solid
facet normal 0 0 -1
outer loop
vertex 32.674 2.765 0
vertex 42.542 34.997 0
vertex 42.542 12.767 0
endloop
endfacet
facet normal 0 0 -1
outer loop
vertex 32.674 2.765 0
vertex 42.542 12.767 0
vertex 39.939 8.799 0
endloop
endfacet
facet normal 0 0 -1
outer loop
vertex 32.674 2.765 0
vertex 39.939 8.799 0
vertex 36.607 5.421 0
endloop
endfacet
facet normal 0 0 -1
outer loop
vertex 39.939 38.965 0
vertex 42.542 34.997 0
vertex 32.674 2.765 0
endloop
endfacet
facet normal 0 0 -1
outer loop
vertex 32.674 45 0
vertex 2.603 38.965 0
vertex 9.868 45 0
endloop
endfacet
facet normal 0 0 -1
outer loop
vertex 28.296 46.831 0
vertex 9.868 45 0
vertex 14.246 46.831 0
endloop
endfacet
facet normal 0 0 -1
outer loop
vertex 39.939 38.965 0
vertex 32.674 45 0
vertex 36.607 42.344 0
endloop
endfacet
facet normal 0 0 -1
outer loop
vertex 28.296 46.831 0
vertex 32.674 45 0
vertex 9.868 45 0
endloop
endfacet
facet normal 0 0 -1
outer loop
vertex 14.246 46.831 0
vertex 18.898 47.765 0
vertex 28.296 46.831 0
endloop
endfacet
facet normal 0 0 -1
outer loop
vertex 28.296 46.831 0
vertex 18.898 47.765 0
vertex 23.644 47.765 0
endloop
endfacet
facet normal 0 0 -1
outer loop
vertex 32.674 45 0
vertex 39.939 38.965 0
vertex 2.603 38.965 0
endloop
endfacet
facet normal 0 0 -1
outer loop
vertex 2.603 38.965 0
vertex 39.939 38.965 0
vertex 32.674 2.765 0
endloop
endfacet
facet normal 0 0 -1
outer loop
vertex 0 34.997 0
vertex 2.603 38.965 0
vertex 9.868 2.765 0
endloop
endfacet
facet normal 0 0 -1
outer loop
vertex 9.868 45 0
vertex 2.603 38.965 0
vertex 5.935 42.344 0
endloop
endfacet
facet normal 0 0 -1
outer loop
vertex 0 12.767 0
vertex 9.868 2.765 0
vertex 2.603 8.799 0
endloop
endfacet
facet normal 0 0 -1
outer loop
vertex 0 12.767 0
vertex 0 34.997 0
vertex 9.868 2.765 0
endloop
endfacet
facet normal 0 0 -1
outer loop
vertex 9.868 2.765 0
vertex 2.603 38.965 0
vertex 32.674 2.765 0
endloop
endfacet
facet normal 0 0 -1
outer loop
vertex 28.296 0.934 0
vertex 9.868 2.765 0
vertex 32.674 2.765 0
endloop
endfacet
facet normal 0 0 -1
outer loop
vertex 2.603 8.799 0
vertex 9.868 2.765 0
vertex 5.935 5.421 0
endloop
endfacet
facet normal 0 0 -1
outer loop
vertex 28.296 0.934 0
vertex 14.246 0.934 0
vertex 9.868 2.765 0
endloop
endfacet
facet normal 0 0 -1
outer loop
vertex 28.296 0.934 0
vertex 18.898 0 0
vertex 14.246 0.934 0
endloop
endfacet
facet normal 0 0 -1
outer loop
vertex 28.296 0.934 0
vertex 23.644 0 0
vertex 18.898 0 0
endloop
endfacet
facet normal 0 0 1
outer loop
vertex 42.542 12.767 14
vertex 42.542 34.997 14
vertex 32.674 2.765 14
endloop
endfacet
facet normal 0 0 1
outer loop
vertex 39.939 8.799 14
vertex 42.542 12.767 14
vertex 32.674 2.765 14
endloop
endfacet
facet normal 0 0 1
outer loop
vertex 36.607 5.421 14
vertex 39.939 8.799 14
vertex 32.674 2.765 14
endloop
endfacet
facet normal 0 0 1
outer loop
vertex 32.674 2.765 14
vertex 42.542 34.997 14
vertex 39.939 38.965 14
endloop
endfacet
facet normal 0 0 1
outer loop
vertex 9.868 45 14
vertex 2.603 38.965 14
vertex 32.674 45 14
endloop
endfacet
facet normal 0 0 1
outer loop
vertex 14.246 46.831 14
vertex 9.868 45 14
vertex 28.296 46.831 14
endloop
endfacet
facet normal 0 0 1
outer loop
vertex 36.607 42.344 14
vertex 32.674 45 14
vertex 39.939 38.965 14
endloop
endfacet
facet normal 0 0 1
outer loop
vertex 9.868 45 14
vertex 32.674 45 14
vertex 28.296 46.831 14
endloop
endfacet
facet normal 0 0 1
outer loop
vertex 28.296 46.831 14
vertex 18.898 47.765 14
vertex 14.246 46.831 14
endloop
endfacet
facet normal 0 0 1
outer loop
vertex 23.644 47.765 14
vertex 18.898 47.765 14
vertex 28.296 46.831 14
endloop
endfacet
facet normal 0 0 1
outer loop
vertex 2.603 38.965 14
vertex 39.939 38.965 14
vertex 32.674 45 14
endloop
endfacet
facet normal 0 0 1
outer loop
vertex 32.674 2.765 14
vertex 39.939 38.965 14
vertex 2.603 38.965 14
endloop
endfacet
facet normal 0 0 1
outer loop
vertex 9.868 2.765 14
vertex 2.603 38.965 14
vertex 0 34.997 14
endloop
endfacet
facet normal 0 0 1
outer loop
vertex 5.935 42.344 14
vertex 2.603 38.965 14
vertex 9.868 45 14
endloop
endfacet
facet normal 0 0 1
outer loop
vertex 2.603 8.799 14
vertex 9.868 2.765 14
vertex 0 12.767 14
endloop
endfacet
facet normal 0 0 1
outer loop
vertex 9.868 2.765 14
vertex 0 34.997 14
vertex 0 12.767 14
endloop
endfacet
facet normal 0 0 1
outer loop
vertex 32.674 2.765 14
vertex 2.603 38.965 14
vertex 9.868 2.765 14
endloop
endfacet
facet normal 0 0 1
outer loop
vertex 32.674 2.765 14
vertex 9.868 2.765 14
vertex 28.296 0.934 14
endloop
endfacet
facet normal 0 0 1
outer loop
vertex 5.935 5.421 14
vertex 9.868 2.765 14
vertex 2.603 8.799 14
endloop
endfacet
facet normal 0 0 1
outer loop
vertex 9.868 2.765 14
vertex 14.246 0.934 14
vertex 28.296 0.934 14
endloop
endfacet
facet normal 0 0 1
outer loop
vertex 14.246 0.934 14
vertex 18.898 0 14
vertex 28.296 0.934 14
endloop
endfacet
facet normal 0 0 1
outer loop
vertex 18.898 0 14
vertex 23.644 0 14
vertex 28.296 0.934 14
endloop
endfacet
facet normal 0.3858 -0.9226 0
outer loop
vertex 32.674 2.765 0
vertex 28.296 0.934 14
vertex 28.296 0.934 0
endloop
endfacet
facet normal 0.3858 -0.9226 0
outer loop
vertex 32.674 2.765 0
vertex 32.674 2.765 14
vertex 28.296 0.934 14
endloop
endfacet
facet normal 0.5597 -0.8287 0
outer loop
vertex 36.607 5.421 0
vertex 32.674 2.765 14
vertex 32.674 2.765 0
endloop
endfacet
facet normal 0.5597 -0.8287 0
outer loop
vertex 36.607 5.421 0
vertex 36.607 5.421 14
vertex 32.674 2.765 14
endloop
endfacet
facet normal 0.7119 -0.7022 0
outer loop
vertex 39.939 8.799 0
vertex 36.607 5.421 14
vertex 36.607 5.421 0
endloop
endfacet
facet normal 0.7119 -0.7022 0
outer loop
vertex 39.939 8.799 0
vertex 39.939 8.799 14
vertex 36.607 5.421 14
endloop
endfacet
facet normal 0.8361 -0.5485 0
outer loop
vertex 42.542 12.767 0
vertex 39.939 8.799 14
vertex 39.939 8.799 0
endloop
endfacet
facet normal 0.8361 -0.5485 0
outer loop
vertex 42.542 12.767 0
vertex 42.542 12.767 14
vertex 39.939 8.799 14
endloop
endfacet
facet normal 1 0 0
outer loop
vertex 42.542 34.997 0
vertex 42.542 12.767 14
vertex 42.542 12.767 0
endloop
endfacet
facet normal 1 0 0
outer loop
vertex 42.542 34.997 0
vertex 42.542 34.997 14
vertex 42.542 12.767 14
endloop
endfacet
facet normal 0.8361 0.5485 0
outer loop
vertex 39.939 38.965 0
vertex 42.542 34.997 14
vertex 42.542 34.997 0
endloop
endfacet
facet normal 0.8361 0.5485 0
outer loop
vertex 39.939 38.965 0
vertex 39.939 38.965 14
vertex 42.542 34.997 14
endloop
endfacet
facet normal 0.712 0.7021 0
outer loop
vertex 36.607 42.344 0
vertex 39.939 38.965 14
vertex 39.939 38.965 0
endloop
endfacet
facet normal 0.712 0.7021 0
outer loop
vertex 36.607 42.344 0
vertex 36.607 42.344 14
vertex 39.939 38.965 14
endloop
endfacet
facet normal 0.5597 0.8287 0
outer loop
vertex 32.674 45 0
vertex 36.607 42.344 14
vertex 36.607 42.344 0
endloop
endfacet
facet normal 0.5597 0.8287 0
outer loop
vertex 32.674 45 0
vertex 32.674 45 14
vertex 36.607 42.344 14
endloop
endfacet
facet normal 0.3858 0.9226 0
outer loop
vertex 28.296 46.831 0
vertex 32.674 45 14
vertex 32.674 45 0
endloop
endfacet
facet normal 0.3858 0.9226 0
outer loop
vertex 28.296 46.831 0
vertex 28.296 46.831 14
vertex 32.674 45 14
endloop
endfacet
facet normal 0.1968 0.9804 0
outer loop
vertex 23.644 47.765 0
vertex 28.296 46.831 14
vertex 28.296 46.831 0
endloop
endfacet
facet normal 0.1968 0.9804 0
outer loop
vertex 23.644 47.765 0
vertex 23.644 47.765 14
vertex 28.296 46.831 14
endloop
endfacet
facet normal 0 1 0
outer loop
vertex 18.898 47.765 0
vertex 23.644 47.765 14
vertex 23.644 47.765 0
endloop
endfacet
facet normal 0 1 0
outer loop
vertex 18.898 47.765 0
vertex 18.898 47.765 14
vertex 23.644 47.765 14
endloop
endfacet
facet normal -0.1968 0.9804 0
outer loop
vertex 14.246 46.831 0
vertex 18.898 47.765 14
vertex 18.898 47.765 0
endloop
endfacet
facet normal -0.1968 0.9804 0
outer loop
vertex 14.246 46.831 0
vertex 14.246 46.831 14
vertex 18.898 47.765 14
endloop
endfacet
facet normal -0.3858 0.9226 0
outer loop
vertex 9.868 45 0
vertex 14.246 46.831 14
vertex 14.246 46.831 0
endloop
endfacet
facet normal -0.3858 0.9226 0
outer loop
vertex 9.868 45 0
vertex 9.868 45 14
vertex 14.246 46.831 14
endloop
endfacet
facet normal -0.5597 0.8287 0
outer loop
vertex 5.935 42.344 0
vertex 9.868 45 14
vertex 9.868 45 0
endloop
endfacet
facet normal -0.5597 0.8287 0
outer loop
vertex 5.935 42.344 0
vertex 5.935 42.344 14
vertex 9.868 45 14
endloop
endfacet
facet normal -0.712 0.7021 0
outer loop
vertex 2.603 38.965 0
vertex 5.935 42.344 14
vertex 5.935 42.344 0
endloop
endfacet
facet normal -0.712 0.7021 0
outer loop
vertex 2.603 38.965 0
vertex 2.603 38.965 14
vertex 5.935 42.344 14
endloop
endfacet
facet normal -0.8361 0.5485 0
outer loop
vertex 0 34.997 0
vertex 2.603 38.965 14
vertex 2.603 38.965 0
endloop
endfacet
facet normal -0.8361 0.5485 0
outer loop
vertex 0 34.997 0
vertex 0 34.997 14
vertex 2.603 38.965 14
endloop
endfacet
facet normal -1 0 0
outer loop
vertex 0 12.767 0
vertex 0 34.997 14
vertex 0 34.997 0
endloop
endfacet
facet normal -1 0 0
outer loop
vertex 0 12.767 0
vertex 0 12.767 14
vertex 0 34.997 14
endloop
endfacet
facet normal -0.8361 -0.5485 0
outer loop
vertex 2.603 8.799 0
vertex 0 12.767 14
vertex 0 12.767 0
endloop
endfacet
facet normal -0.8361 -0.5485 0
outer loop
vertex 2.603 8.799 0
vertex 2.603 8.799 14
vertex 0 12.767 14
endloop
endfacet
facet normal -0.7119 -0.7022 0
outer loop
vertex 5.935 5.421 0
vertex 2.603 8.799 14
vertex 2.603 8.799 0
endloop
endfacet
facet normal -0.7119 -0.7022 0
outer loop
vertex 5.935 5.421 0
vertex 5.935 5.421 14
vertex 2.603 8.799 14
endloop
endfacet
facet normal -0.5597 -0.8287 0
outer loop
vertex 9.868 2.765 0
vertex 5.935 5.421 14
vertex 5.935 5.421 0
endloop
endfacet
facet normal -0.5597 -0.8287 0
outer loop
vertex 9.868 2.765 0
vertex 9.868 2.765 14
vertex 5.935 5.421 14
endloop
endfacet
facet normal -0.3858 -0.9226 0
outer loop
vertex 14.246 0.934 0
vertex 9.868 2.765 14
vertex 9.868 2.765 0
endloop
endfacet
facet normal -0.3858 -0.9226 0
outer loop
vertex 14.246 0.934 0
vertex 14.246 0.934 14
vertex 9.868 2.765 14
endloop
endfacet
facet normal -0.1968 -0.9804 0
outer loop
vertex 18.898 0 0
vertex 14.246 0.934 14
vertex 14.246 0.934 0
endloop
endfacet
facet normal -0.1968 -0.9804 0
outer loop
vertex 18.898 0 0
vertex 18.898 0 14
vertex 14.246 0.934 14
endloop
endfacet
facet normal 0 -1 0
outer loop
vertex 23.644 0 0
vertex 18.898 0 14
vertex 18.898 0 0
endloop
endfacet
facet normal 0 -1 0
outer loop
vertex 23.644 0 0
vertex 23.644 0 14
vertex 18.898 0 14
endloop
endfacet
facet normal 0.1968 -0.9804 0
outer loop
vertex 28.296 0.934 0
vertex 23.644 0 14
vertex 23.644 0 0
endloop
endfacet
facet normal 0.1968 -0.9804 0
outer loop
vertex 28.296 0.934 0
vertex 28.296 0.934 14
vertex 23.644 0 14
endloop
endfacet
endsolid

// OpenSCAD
$fn = 32;

// ----------------------------------------------------------------------
// Flat adaptor: double_d, 14 mm thick
// ----------------------------------------------------------------------

// --- parameters (mm) ---
profile_height = 14;      // extrusion height
profile_points = 24;      // points of the closed outline

profile = [[42.542, 34.997], [39.939, 38.965], [36.607, 42.344], [32.674, 45], [28.296, 46.831], [23.644, 47.765], [18.898, 47.765], [14.246, 46.831], [9.868, 45], [5.935, 42.344], [2.603, 38.965], [0, 34.997], [0, 12.767], [2.603, 8.799], [5.935, 5.421], [9.868, 2.765], [14.246, 0.934], [18.898, 0], [23.644, 0], [28.296, 0.934], [32.674, 2.765], [36.607, 5.421], [39.939, 8.799], [42.542, 12.767]];  // single closed polygon, 24 points, counter clockwise

// --- the one profile operation ---
linear_extrude(height = profile_height) polygon(points = profile);
